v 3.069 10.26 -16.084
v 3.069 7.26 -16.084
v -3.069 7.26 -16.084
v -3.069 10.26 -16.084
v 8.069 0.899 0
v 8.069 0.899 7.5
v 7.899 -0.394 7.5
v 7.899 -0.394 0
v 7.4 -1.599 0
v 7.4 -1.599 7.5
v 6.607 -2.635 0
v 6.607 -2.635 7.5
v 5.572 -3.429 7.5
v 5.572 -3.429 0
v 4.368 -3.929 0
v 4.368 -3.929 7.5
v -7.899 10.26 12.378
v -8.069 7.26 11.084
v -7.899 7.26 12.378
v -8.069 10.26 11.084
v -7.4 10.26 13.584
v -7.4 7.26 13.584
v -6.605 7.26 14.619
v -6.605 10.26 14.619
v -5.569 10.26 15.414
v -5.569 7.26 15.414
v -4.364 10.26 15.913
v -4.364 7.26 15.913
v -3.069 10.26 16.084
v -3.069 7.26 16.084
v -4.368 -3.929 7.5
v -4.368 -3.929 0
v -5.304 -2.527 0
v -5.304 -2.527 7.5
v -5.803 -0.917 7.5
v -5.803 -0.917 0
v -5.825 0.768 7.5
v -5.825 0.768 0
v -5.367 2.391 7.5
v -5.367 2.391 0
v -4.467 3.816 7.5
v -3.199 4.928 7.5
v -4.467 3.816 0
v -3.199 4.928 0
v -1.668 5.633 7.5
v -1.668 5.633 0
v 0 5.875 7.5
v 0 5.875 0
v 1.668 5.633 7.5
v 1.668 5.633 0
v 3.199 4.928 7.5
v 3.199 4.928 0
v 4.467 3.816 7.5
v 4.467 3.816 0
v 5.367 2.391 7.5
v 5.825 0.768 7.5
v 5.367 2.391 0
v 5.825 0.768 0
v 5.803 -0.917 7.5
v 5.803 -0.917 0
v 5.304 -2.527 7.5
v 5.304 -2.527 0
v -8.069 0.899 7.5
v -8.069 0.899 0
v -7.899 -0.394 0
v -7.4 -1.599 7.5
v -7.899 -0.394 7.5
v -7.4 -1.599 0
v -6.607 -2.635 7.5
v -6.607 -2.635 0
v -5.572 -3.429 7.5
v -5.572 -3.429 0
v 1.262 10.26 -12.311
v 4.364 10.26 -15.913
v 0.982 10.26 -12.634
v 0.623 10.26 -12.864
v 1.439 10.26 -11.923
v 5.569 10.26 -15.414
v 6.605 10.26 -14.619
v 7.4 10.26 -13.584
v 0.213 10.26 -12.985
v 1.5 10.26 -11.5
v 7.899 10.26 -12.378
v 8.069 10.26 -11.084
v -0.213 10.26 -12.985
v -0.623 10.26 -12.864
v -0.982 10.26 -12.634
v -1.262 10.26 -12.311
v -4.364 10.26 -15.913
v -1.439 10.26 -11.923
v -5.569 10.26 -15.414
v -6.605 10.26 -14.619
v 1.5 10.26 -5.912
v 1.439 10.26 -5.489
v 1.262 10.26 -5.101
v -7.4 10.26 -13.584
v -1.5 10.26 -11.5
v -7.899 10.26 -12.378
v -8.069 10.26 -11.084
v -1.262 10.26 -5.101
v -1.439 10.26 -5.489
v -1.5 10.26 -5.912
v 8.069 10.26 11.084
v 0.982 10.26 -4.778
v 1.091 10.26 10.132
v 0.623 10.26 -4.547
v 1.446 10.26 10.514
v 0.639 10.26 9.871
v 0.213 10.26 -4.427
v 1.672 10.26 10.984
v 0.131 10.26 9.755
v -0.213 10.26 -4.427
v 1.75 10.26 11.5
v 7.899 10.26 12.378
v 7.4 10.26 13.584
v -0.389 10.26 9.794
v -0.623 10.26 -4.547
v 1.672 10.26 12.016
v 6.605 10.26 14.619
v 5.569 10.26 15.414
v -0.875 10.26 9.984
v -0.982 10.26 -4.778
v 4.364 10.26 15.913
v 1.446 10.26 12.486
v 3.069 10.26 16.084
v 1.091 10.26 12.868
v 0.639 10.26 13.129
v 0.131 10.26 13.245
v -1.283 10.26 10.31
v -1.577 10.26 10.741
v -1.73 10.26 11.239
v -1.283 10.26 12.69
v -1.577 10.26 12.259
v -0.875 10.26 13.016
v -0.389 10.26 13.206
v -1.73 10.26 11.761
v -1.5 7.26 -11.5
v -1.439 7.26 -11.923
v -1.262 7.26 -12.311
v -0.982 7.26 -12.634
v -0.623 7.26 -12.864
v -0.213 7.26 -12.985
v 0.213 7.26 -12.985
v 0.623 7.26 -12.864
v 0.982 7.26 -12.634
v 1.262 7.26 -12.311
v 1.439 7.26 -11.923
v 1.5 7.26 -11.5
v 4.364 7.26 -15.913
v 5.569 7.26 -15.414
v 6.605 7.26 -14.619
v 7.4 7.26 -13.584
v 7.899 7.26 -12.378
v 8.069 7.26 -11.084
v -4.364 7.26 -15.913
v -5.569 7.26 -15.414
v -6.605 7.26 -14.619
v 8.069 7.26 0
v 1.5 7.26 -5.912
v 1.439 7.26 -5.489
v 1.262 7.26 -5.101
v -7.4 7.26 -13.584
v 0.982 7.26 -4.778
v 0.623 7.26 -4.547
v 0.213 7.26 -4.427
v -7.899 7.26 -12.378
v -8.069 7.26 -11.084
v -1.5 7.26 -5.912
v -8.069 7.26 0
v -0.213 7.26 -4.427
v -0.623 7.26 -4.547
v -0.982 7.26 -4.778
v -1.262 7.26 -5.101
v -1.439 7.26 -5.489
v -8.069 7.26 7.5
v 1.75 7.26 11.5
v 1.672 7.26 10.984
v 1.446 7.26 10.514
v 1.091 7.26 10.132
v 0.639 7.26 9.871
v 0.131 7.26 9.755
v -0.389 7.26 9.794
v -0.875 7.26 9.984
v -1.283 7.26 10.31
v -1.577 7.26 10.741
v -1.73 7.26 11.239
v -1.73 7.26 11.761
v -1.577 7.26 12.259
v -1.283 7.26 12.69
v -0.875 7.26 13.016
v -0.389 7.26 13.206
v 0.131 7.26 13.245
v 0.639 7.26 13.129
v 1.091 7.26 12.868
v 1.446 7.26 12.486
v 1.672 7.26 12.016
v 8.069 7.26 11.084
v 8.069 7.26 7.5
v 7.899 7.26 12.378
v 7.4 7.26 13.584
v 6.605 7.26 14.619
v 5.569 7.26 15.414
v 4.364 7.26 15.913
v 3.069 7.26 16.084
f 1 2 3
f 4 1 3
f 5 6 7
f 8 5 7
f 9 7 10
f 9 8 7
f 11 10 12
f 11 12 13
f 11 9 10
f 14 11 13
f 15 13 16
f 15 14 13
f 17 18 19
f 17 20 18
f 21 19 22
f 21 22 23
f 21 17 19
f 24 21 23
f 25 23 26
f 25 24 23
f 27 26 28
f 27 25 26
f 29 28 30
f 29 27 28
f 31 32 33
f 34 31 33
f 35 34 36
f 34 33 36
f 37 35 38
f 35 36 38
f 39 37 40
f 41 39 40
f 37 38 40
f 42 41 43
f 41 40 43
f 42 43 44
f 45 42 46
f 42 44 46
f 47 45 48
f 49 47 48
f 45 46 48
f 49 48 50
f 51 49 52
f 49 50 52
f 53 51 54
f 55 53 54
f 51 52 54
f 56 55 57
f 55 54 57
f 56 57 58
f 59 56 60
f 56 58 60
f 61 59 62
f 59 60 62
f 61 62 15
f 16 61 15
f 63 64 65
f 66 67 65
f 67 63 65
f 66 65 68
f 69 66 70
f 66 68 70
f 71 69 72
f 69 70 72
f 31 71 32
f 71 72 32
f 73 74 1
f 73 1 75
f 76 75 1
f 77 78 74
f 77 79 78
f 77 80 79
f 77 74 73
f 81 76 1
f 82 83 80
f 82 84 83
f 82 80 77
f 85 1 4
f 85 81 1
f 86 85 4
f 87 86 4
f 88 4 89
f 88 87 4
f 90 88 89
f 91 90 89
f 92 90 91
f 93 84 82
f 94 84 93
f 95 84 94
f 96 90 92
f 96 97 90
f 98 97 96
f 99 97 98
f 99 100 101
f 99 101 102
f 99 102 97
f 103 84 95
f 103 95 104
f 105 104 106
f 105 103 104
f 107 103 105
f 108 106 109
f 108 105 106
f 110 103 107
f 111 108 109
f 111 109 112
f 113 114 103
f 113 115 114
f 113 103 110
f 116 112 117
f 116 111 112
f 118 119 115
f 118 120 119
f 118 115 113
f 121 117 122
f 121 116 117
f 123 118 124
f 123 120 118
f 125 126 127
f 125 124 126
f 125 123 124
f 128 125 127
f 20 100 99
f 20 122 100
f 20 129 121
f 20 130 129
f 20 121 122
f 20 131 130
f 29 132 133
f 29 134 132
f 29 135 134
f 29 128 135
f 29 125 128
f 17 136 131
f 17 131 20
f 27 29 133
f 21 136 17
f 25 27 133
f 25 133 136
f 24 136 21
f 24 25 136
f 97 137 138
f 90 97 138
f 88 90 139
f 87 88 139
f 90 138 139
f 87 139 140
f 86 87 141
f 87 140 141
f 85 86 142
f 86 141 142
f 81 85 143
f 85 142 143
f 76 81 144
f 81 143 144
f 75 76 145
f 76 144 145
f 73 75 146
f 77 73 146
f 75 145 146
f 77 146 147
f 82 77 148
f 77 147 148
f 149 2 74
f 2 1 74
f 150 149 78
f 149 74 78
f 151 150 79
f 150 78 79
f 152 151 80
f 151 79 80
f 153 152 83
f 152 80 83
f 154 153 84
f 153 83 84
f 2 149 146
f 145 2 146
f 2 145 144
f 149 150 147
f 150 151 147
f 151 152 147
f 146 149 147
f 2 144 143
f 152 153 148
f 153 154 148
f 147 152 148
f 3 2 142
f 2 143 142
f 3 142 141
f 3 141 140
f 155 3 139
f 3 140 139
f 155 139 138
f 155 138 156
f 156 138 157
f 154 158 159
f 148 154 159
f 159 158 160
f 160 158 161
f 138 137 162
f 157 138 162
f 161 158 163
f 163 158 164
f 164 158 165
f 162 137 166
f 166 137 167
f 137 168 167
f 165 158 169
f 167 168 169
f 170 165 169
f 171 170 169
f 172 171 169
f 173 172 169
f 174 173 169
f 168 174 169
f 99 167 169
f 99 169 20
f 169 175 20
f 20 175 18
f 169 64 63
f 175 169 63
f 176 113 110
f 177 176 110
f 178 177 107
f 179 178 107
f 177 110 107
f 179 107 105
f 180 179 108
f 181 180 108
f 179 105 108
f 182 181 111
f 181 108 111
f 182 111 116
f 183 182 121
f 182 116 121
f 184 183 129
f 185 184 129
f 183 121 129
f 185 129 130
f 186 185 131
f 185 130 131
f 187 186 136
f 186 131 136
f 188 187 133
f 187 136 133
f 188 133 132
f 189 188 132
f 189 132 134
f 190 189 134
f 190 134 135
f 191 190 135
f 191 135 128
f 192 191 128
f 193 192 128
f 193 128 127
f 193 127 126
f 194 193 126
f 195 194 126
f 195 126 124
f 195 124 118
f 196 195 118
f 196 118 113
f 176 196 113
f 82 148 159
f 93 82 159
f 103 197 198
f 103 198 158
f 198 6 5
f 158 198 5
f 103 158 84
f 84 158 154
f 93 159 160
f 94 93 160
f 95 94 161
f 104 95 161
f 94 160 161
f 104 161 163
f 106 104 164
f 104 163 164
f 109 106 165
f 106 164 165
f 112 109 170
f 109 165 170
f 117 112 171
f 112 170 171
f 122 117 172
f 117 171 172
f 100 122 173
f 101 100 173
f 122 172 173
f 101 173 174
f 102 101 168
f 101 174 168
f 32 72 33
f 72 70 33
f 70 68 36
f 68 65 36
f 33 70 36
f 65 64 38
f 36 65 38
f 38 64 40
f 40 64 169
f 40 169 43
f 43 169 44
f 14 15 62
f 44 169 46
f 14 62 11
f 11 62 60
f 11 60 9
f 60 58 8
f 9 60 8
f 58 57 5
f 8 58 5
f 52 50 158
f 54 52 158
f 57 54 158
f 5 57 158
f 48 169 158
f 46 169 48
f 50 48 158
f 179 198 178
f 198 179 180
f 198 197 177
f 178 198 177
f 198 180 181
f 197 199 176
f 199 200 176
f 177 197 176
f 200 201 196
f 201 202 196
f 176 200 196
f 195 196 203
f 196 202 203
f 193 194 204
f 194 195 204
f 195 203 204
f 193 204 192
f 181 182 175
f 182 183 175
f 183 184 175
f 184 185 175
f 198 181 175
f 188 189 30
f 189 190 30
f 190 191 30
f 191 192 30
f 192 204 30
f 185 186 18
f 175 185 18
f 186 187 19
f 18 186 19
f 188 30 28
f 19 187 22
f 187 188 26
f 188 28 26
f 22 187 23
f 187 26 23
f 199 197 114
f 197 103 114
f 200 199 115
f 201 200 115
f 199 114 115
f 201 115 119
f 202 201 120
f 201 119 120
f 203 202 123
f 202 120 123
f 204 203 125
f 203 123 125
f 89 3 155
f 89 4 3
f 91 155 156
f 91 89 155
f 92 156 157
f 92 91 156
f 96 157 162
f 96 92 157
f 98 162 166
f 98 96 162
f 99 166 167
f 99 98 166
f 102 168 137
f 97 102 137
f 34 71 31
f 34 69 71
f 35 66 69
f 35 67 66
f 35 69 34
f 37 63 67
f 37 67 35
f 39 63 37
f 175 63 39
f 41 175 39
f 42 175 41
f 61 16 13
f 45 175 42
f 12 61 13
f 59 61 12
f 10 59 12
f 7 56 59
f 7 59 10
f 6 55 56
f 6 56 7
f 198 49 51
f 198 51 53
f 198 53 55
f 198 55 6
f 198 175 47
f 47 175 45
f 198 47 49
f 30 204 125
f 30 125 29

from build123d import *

# Parameters (mm, degrees)
F1_DEPTH    = 7.5
F2_W        = 16.1389429122
F2_H        = 16.083650291
F3_DEPTH    = 3
F4_D        = 3.5
F5_T1_DEPTH = 48.2954240112
F6_R        = 5


# Not quite as in the source:
# - a fillet or chamfer that OpenCascade refuses, or shapes differently, is made with other operations: its cross-section is extruded or revolved along the edge and cut away or added


with BuildPart() as f1:
    # F0 (on Top) → F1 (new body)
    with BuildSketch(Plane.XY):
        with BuildLine():
            ThreePointArc((-4.3675557451, -3.9293869513), (0, 5.875), (4.3675557451, -3.9293869513))
            Line((4.3675557451, -3.9293869513), (8.0694714561, -7.2599132545))
            Line((8.0694714561, -7.2599132545), (8.0694714561, 7.2599132545))
            Line((8.0694714561, 7.2599132545), (-8.0694714561, 7.2599132545))
            Line((-8.0694714561, 7.2599132545), (-8.0694714561, -7.2599132545))
            Line((-8.0694714561, -7.2599132545), (-4.3675557451, -3.9293869513))
        make_face()
    extrude(amount=F1_DEPTH)

    # F2 (on face) → F3 (join)
    with BuildSketch(Plane(origin=(0, 7.2599132545, 0), x_dir=(-1, 0, 0), z_dir=(0, 1, 0))):
        with Locations((0, -8.0418251455)):
            Rectangle(F2_W, F2_H)
        with BuildLine():
            Line((1.5, -5.9119383805), (1.5, -11.5))
            ThreePointArc((1.5, -11.5), (0, -13), (-1.5, -11.5))
            Line((-1.5, -11.5), (-1.5, -5.9119383805))
            ThreePointArc((-1.5, -5.9119383805), (0, -4.4119383805), (1.5, -5.9119383805))
        make_face(mode=Mode.SUBTRACT)
        with Locations((0, 8.0418251455)):
            Rectangle(F2_W, F2_H)
    extrude(amount=F3_DEPTH)

    # F4 (through all)
    with Locations(Plane(origin=(0, 7.2599132545, 0), x_dir=(-1, 0, 0), z_dir=(0, -1, 0))):
        with Locations((0, -11.5)):
            Hole(F4_D / 2)

    # F5: fillet of radius 5 on 2 edges, made by hand

    # F5_s2 → F5_t1 (cut)
    with BuildSketch(Plane.XY.offset(-20.3977120056)):
        with BuildLine():
            ThreePointArc((-8.0694714561, 0.8991715477), (-7.0374949846, -2.1429969679), (-4.3675557451, -3.9293869513))
            Line((-4.3675557451, -3.9293869513), (-8.0694714561, -7.2599132545))
            Line((-8.0694714561, -7.2599132545), (-8.0694714561, 0.8991715477))
        make_face()
        with BuildLine():
            ThreePointArc((8.0694714561, 0.8991715477), (7.0374949846, -2.1429969679), (4.3675557451, -3.9293869513))
            Line((4.3675557451, -3.9293869513), (8.0694714561, -7.2599132545))
            Line((8.0694714561, -7.2599132545), (8.0694714561, 0.8991715477))
        make_face()
    extrude(amount=F5_T1_DEPTH, mode=Mode.SUBTRACT)

    # F6
    f6_edges = [f1.edges().sort_by_distance(p)[0] for p in [
        (-8.069471, 8.759913, 16.08365),
        (8.069471, 8.759913, 16.08365),
        (8.069471, 8.759913, -16.08365),
        (-8.069471, 8.759913, -16.08365),
    ]]
    fillet(f6_edges, radius=F6_R)


solid = f1.part
